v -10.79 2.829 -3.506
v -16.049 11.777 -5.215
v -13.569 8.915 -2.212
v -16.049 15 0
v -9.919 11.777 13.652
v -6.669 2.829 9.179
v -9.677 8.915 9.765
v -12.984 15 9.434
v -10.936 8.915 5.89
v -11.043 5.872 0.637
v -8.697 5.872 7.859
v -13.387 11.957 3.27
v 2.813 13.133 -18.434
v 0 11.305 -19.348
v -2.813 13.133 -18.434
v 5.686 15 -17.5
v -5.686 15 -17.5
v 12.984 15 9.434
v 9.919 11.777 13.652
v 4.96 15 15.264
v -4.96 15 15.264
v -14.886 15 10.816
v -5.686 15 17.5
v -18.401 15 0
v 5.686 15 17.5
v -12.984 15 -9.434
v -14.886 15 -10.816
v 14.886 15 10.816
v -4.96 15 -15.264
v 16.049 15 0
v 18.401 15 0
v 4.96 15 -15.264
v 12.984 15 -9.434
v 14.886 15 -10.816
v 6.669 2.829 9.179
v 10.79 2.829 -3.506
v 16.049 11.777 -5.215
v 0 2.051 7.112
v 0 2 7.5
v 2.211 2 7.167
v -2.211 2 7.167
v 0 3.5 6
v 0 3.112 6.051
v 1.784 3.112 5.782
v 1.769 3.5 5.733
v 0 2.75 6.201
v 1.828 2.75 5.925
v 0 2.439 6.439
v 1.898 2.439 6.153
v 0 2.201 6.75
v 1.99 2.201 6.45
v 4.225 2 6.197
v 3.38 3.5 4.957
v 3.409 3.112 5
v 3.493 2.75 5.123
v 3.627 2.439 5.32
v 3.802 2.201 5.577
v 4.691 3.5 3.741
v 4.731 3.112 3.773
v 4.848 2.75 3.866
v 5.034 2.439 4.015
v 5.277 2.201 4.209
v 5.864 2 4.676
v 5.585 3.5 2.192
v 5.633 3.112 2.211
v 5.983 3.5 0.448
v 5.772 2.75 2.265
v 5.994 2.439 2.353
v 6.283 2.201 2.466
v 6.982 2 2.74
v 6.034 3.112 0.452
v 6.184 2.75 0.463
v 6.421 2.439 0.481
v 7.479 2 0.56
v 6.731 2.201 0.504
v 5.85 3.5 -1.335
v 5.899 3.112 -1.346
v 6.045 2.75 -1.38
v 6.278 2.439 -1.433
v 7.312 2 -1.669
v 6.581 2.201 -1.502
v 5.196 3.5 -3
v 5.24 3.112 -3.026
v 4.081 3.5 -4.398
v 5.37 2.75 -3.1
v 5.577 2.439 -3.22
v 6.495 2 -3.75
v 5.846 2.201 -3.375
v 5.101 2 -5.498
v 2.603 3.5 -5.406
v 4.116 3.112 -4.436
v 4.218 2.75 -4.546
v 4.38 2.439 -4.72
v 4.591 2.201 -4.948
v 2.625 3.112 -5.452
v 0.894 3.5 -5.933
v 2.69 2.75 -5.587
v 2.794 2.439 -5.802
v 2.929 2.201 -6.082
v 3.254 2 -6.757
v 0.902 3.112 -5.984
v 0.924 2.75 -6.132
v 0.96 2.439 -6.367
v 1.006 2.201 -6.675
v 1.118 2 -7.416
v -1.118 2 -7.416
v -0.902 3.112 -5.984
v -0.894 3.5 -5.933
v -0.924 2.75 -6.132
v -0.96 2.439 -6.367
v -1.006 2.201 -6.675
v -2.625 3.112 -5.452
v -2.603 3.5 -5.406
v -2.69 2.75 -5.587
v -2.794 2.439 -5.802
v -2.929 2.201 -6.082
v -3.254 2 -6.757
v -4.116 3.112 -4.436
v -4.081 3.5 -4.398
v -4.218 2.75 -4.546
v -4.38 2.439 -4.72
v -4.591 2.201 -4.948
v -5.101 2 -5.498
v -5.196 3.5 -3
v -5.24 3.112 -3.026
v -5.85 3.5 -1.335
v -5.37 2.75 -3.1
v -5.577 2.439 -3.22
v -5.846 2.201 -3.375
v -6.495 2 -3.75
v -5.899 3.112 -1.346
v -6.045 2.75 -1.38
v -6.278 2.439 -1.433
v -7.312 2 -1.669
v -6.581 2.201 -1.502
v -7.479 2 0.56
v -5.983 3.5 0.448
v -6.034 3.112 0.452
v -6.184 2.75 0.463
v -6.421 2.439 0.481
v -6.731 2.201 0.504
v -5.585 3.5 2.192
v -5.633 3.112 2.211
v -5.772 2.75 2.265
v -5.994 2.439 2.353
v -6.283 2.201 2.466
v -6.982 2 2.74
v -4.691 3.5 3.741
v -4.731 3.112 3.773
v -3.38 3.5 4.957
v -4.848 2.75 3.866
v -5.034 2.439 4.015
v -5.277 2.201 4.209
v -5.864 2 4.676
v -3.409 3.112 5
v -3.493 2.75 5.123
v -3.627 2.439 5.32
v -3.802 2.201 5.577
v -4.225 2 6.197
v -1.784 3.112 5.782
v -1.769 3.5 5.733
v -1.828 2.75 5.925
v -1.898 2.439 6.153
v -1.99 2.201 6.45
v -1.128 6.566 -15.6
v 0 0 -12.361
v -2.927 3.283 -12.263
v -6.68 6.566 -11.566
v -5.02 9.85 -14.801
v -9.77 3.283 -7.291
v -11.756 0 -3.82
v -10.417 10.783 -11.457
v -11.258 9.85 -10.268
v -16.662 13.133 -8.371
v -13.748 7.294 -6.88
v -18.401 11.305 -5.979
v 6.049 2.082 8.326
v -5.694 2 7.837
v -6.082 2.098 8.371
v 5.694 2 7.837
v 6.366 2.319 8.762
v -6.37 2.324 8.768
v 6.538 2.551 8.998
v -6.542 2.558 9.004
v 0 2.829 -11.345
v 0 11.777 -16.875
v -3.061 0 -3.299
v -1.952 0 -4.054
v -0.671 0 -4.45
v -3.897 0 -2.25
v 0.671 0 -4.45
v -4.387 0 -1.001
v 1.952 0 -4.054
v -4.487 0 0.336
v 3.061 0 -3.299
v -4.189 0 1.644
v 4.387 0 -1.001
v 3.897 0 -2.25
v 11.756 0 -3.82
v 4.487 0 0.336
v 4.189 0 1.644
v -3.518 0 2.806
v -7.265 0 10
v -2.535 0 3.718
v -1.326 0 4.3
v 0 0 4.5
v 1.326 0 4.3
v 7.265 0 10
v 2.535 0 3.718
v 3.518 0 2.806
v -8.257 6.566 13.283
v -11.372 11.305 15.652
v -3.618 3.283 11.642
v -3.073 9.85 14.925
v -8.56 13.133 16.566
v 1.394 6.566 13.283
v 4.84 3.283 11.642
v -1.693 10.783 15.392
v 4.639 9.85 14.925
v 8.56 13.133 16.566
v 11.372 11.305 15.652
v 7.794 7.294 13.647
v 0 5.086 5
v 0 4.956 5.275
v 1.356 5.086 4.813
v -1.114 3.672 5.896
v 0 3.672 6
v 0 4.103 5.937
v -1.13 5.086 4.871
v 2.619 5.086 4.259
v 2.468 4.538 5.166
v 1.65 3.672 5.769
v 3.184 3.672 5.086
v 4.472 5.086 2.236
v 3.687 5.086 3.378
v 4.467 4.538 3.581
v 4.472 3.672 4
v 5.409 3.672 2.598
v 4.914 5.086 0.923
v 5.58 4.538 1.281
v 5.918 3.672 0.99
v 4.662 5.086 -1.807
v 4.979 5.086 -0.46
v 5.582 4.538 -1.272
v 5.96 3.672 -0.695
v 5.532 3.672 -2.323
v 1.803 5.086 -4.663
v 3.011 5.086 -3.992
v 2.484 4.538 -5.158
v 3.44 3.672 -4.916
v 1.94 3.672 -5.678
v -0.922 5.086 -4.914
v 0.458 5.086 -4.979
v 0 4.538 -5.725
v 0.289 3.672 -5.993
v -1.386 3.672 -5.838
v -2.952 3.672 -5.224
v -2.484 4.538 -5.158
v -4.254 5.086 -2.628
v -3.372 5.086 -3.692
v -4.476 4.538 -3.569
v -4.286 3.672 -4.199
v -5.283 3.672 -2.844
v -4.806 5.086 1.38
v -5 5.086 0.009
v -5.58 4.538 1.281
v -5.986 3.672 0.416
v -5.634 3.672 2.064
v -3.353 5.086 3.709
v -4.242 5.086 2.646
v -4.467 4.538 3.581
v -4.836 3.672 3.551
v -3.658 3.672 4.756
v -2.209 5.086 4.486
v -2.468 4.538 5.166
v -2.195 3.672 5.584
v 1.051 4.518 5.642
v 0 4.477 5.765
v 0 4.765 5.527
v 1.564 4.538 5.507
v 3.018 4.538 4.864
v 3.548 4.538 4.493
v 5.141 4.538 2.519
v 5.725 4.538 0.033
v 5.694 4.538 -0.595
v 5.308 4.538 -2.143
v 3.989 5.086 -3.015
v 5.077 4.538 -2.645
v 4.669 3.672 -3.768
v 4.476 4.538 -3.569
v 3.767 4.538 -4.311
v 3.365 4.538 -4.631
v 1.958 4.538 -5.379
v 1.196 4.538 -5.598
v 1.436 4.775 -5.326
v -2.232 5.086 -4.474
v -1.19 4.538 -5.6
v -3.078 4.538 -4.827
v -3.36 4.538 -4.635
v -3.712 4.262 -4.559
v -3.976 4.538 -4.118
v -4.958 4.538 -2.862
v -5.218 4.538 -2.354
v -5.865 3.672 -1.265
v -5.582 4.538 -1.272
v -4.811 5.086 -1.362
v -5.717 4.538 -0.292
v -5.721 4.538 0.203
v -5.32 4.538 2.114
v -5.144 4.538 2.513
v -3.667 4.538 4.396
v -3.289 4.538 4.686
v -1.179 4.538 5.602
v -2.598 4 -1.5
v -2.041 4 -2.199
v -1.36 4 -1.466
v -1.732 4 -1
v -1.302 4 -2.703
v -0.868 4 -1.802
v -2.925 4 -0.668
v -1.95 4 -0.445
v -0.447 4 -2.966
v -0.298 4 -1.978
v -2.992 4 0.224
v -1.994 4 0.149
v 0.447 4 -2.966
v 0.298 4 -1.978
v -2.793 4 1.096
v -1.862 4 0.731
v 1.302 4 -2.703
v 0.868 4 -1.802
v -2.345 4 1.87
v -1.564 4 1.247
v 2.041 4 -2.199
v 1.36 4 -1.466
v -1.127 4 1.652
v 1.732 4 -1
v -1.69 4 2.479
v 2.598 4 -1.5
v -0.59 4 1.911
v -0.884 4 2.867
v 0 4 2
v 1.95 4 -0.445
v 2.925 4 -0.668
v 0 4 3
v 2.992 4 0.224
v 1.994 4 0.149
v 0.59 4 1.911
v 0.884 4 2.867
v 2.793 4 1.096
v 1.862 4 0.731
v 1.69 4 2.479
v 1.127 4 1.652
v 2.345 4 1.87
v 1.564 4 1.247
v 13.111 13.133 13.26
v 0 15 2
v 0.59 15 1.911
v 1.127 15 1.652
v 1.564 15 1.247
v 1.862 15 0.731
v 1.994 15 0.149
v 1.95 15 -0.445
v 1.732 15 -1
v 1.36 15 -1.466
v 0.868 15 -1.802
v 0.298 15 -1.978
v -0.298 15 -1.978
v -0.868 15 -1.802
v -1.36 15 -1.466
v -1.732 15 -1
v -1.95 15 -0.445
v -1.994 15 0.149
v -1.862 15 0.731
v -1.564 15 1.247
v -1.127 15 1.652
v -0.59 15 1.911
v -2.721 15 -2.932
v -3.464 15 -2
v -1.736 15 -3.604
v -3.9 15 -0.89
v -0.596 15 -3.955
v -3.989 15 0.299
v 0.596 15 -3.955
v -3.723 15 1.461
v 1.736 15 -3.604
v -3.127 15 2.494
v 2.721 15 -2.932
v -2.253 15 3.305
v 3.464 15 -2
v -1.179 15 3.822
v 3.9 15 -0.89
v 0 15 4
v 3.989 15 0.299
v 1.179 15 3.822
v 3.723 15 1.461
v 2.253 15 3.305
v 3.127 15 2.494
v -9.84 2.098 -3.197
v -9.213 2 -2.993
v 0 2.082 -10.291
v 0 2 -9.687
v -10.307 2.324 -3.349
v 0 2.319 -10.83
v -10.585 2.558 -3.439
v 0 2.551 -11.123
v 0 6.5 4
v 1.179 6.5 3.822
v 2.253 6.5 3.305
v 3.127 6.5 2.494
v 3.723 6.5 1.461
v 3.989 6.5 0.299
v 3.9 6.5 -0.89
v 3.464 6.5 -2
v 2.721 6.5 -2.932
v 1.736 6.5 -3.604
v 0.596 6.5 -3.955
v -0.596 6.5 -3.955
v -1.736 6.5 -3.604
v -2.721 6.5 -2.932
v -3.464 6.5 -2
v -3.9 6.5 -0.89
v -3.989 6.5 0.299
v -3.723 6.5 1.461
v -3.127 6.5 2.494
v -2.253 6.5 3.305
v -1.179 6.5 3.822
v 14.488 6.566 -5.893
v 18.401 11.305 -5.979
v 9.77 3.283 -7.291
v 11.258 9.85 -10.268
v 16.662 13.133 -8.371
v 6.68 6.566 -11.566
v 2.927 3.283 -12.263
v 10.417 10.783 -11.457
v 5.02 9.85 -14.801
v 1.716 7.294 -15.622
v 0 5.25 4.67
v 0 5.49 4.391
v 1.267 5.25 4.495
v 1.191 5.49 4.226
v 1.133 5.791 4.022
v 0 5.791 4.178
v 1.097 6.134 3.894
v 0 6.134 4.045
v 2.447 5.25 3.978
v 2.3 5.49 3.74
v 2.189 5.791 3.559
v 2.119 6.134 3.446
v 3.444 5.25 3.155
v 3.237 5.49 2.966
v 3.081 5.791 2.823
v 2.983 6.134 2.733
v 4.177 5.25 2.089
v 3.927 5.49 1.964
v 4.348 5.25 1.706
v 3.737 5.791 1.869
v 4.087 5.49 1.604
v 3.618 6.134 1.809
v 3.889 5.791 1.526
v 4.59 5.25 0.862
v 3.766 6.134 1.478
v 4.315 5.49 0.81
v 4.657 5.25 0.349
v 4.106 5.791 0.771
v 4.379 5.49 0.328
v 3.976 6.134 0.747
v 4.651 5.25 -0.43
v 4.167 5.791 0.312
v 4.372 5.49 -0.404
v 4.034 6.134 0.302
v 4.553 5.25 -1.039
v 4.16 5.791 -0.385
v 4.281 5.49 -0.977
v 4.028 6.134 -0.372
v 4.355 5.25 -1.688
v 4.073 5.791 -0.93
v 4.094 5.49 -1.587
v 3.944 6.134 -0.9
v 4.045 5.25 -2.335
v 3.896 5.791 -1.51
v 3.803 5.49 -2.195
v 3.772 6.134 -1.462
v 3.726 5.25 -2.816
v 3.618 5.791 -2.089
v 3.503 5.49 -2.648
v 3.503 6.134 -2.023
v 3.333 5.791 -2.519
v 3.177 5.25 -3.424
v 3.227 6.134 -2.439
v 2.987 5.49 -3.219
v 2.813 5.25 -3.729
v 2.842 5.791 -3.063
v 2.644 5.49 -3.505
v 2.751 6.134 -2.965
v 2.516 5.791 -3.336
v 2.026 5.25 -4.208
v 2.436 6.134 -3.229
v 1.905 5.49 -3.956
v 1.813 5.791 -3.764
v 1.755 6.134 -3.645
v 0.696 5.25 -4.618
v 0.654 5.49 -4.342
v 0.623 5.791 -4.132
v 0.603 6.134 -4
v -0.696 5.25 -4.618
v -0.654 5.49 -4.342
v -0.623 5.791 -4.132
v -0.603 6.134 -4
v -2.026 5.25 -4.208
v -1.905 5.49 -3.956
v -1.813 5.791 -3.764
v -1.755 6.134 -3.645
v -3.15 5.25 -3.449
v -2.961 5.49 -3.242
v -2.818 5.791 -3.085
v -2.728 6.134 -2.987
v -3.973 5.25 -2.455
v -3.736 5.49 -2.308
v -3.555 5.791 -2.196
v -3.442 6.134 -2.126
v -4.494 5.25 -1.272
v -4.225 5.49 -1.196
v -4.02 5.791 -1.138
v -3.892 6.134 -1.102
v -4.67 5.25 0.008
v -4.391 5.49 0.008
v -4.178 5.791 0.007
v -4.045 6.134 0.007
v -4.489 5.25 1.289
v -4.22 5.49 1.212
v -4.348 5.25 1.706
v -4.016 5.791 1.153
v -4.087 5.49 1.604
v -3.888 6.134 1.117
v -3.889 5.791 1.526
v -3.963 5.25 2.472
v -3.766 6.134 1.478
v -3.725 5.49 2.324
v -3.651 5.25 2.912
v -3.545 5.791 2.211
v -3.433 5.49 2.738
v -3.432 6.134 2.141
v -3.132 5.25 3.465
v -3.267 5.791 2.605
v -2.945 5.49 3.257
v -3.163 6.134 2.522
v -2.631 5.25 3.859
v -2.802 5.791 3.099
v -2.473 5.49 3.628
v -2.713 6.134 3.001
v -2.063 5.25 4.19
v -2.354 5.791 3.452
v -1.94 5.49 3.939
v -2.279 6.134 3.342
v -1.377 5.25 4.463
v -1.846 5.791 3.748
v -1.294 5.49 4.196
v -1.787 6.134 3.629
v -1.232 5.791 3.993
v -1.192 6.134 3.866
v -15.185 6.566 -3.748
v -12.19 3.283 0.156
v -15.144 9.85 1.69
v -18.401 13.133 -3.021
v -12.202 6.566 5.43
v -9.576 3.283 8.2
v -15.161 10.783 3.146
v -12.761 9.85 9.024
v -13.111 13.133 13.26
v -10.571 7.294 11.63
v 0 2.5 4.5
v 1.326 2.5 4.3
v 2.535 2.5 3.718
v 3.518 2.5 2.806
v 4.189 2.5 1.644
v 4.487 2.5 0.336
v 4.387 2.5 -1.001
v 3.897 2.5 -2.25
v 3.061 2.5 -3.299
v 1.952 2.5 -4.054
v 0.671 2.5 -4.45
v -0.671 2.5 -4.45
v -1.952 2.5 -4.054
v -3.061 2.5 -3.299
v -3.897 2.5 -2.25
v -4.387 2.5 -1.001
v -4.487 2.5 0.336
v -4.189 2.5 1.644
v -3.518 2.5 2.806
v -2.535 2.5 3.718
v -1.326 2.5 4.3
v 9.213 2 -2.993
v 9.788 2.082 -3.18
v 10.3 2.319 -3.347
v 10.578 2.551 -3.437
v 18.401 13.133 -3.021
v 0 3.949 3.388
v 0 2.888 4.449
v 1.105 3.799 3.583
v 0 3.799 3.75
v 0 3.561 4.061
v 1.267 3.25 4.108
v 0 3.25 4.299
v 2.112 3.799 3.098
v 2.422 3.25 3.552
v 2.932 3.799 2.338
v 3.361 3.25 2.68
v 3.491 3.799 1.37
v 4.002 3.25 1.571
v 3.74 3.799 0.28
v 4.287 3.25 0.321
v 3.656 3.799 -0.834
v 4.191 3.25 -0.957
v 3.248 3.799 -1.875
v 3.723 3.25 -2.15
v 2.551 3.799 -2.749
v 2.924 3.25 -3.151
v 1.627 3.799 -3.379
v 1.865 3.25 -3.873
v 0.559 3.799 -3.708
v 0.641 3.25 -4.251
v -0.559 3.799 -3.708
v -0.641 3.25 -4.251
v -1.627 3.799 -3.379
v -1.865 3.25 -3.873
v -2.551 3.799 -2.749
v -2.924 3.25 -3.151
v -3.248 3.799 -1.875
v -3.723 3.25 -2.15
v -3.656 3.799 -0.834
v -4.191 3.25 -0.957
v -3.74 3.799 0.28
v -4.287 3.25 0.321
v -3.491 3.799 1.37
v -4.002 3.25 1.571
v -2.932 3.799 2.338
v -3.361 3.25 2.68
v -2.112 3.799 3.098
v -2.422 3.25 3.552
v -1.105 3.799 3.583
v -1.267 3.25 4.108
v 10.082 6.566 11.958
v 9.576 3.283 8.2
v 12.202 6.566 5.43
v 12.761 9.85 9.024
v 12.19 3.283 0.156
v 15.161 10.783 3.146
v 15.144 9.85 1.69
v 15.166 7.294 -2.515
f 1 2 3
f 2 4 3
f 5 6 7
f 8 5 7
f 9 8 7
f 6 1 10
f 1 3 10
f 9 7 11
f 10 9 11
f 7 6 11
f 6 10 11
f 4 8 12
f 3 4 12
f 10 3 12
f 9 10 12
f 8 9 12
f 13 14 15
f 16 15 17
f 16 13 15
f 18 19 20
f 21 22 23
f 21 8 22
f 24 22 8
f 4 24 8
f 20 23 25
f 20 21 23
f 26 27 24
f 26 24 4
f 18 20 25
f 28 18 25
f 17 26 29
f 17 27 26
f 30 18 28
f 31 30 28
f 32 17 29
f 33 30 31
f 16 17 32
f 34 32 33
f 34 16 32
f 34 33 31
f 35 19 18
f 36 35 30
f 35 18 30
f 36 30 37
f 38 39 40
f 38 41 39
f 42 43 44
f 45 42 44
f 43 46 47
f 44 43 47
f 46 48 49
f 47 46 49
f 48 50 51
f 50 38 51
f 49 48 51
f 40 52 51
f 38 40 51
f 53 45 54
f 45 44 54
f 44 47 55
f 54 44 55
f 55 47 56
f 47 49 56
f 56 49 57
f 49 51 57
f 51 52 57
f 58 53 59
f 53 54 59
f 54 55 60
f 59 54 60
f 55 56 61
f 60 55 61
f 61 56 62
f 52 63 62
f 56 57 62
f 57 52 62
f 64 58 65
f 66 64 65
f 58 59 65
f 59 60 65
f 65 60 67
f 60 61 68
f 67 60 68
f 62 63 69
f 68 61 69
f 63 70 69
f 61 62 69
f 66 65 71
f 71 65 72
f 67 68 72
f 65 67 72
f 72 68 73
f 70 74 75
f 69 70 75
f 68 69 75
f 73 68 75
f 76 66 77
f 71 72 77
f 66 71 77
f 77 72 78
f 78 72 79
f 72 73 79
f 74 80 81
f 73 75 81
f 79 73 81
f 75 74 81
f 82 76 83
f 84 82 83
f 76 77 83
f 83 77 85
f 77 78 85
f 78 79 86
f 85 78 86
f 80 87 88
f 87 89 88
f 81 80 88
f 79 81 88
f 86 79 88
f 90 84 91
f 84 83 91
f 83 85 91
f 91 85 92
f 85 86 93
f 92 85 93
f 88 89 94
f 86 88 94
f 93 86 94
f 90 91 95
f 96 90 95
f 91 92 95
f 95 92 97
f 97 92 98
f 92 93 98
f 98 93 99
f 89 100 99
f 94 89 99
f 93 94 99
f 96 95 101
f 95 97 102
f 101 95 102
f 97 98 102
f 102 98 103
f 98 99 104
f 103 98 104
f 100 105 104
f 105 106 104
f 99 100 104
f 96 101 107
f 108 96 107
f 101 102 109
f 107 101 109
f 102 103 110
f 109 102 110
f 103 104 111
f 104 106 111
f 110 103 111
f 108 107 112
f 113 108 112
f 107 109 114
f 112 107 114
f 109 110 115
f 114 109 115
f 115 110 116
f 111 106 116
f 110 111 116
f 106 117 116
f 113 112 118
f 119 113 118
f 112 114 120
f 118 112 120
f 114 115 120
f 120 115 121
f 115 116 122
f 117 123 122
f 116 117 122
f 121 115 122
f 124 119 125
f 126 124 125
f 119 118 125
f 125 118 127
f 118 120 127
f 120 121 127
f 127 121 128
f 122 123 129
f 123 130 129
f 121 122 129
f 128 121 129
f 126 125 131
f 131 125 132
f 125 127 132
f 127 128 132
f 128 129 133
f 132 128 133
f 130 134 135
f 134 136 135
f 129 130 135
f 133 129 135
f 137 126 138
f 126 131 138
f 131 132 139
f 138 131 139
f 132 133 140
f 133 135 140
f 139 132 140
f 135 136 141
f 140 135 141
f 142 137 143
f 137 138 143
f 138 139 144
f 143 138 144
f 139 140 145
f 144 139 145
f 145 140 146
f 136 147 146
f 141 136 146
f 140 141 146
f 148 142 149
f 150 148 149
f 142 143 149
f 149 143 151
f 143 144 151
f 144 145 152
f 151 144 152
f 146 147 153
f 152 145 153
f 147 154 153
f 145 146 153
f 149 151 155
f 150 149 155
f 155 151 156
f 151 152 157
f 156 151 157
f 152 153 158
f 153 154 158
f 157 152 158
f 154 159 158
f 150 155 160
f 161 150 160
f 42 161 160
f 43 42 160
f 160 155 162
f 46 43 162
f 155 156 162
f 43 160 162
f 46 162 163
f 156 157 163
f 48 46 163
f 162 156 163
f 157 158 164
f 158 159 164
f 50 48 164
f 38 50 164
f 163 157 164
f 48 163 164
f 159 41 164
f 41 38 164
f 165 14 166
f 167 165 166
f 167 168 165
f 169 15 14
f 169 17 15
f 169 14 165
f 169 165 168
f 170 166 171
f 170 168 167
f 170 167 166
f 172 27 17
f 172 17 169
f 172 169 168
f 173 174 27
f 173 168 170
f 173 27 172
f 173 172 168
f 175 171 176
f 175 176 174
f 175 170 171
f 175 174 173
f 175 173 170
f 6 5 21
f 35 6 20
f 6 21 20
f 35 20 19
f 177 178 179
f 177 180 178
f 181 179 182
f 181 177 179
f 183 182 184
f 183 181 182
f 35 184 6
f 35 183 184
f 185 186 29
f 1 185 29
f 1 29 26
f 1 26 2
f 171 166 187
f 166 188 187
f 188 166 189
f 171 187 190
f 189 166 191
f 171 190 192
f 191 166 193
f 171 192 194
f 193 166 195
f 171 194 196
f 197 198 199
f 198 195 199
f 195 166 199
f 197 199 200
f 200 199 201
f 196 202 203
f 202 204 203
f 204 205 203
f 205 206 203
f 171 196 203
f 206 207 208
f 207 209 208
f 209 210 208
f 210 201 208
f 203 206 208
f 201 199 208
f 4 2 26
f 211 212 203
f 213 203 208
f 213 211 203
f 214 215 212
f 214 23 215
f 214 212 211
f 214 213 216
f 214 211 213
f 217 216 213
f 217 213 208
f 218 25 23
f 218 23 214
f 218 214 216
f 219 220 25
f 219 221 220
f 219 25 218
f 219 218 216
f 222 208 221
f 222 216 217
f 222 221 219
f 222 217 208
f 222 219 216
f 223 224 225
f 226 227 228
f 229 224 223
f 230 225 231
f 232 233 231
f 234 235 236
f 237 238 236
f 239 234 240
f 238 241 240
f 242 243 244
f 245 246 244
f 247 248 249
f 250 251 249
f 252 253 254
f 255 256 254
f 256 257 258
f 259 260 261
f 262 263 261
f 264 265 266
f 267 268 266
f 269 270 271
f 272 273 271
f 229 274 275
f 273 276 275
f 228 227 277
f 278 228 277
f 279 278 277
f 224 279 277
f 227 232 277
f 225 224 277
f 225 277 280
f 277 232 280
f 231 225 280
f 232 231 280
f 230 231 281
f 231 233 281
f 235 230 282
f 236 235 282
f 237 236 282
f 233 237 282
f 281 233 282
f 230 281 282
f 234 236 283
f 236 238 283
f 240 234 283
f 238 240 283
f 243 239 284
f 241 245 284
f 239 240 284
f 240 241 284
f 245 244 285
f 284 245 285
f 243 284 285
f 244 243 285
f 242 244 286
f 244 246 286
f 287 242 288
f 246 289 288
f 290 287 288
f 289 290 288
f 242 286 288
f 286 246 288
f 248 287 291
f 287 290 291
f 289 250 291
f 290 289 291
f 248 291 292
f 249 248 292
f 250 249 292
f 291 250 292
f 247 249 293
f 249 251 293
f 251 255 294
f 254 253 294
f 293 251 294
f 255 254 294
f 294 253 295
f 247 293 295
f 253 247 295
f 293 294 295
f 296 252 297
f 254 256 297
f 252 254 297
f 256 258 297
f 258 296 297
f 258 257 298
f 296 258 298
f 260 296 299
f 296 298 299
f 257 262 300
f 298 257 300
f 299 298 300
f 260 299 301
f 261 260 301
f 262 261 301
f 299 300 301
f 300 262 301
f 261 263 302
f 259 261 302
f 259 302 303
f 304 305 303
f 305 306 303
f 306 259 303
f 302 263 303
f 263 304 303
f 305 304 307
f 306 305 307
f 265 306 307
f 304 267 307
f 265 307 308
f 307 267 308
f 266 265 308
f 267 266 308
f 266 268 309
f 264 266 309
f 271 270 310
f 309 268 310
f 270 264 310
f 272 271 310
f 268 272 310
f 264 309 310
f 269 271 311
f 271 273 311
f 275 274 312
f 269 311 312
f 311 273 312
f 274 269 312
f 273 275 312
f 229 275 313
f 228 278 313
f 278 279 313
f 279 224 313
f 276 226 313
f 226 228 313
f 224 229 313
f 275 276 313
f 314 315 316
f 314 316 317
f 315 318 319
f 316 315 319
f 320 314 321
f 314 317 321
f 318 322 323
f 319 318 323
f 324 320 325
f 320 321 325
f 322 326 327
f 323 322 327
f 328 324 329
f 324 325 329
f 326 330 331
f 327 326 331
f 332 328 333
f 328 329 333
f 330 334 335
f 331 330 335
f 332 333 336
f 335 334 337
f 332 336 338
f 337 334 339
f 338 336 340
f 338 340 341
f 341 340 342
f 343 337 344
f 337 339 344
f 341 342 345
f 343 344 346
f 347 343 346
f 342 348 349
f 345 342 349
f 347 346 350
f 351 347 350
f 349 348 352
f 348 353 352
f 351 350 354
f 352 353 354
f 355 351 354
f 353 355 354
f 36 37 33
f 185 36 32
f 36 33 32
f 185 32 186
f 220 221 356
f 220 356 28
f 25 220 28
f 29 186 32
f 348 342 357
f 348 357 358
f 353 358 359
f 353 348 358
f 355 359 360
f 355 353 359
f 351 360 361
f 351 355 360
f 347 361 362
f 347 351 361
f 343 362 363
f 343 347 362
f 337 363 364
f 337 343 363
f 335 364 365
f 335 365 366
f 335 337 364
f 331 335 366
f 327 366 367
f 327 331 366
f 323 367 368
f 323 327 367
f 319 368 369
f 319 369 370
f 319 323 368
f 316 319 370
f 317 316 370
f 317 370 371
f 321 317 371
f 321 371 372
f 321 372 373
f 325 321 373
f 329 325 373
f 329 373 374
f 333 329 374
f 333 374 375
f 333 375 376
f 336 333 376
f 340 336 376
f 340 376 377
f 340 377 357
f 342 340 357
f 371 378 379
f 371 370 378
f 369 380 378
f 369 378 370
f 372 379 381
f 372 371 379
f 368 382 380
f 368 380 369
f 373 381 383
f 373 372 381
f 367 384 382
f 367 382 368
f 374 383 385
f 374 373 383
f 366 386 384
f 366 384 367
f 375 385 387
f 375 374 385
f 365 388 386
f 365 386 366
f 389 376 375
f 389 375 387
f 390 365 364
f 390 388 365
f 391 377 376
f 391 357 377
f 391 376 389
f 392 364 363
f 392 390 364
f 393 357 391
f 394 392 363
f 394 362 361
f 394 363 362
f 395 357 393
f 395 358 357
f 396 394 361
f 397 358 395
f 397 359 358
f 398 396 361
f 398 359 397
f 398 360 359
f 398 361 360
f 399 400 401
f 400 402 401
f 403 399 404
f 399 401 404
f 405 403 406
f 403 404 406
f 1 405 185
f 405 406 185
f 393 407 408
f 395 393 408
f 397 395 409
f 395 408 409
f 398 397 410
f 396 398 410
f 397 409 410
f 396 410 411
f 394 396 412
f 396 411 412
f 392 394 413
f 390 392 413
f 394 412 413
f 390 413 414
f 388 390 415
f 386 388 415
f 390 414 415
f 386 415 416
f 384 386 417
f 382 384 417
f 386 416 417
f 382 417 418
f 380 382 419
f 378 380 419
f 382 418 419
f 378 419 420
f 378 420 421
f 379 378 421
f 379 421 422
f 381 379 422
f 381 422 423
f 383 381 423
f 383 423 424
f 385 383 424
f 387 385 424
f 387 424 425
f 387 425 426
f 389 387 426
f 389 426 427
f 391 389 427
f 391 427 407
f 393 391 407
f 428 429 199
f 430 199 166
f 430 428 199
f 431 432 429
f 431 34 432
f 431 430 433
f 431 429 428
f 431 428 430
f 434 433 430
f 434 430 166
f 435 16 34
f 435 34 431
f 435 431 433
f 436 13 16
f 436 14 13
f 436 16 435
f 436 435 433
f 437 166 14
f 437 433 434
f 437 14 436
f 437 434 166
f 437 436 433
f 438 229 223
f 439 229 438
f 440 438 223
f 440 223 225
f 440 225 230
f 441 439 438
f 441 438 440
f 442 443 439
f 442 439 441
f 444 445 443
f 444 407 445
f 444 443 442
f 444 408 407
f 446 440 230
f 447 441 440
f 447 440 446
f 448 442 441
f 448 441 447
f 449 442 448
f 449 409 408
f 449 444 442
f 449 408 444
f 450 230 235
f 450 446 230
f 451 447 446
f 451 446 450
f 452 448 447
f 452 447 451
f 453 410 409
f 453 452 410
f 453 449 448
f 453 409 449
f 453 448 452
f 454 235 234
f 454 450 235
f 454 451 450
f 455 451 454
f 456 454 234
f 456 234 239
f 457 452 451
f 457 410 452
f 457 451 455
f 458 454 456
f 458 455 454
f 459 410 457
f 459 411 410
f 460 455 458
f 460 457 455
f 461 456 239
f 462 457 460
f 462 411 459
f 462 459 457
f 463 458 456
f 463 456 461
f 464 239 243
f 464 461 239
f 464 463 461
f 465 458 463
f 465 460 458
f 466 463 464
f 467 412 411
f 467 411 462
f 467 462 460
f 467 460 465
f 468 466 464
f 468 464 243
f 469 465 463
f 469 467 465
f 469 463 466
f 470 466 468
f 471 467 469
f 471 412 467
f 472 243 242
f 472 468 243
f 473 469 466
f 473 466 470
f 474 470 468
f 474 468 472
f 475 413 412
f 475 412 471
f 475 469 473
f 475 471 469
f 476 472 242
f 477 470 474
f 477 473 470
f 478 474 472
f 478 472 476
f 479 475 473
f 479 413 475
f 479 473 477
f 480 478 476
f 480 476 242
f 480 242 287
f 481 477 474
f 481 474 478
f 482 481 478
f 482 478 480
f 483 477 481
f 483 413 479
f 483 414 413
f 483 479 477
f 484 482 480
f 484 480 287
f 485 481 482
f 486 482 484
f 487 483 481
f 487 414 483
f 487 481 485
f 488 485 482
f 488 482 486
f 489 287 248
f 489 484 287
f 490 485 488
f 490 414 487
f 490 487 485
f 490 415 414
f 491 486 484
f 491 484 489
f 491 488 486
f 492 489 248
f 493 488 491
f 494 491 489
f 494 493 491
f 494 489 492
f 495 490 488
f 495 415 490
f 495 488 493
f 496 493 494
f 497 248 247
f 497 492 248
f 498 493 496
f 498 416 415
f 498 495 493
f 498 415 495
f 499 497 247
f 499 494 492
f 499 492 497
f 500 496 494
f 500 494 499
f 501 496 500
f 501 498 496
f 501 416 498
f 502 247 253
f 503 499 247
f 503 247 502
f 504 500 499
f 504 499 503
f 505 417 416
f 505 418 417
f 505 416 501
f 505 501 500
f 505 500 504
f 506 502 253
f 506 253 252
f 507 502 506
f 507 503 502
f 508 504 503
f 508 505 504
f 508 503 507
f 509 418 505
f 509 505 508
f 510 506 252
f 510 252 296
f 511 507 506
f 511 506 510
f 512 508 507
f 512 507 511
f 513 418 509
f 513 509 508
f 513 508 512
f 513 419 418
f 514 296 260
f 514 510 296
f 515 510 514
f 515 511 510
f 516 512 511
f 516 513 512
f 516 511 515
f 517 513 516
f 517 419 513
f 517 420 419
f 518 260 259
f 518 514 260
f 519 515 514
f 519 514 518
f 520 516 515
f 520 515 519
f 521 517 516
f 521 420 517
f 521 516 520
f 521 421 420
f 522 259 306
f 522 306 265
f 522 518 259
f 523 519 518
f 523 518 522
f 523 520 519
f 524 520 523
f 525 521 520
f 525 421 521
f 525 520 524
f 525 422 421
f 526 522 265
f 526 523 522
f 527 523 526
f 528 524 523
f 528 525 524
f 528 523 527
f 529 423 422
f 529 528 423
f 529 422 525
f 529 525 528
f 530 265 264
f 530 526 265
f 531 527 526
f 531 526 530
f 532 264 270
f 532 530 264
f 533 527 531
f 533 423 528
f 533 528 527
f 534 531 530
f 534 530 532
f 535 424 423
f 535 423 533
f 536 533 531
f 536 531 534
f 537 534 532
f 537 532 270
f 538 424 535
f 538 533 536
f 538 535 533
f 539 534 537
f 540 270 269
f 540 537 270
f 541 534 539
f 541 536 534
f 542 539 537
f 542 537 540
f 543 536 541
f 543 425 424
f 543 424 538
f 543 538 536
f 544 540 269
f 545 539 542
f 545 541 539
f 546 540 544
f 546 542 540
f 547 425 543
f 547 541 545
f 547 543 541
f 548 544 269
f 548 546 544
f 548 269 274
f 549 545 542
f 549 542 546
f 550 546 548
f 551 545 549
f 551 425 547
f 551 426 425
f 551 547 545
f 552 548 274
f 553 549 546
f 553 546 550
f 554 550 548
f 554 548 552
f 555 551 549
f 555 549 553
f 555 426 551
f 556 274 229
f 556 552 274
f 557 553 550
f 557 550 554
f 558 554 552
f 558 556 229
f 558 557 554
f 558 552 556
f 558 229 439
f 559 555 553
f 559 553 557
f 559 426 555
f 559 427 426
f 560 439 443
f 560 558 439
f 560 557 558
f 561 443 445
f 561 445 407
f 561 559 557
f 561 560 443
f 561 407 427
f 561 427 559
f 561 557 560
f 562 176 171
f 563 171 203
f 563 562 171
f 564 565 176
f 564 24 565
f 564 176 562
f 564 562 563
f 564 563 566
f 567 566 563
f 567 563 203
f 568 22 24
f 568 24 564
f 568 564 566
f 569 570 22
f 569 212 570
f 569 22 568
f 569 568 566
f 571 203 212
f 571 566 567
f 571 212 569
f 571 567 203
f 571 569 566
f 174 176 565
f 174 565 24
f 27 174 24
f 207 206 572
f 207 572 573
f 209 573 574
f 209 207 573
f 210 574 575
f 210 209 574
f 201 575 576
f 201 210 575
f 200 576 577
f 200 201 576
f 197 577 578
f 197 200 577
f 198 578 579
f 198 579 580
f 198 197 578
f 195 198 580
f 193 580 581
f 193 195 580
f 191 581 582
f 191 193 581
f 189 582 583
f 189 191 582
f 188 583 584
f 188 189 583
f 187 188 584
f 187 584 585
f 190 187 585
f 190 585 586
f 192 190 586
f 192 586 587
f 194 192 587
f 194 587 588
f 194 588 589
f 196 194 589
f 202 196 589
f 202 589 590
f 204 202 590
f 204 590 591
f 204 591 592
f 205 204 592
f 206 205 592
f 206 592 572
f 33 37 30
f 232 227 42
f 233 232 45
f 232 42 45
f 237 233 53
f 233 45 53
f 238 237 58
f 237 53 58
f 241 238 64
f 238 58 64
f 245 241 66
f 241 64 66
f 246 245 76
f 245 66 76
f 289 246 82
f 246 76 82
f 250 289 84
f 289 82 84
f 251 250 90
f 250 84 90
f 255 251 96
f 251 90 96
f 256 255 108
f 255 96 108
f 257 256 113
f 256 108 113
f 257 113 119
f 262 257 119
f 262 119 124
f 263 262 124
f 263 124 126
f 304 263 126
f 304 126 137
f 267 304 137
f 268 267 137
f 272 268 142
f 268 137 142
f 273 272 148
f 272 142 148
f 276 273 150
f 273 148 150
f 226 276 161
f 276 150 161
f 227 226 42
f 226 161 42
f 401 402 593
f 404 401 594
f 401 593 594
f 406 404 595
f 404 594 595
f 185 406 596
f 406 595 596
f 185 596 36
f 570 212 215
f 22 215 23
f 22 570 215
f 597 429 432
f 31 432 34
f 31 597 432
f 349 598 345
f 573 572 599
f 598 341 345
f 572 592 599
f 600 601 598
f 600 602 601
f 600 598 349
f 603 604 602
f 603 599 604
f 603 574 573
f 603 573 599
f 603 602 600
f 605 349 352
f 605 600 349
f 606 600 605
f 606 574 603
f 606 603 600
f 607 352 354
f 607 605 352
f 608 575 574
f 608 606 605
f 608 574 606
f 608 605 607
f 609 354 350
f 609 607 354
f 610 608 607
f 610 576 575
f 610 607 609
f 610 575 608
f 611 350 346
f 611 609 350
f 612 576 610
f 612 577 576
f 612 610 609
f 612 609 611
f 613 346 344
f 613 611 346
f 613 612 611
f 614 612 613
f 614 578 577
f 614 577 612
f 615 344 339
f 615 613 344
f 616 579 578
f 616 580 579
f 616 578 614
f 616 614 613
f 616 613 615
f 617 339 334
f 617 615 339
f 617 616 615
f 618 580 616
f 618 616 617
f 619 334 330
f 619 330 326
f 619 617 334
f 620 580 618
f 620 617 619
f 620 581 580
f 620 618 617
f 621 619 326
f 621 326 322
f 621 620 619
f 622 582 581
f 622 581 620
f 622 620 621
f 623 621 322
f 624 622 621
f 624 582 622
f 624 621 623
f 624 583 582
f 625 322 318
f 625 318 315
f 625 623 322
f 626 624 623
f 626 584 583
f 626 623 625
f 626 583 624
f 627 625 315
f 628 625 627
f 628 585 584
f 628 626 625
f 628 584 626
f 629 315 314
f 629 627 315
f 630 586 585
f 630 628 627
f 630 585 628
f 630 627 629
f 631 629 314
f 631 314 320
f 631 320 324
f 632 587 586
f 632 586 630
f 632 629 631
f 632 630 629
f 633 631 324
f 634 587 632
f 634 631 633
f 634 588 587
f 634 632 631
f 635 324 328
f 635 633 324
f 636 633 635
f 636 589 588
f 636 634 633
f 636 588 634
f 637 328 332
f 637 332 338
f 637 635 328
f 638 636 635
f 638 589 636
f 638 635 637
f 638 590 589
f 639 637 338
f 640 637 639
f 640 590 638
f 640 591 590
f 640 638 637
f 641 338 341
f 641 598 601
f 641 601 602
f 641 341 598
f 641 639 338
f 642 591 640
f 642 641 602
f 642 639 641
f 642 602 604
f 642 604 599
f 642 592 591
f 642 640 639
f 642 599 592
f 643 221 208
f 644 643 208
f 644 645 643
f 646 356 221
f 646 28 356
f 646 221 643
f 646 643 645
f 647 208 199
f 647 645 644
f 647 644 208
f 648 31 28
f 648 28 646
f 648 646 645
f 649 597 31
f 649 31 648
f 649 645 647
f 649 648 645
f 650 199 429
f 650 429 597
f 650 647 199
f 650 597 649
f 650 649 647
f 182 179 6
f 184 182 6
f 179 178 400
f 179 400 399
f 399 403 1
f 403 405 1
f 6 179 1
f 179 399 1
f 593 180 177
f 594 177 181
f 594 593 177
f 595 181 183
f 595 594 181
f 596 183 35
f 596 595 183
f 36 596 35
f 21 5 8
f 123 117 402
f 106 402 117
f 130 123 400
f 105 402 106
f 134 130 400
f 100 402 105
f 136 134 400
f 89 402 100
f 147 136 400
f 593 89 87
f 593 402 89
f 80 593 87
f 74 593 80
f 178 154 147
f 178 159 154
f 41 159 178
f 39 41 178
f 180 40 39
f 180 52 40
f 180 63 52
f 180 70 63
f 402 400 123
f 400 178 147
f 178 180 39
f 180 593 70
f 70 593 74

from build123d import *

# Parameters (mm, degrees)
BOSS_EXTRUDE1_DEPTH     = 30
BOSS_EXTRUDE1_TAPER     = -26.56505118
SKETCH3_OUTSIDE_W       = 108.076
SKETCH3_OUTSIDE_H       = 105.2
CUT_EXTRUDE1_DEPTH      = 30
CUT_EXTRUDE1_TAPER      = 26.56505118
SKETCH5_R               = 19.347524159
CUT_EXTRUDE2_DEPTH      = 25
SHELL1_T                = -2
SKETCH6_R               = 4
SKETCH6_R_2             = 2
BOSS_EXTRUDE2_DEPTH     = 13
SKETCH10_R              = 6
SKETCH10_R_2            = 4
BOSS_EXTRUDE4_DEPTH     = 3
FILLET5_R               = 1.5
SKETCH10_3_R            = 4.5
SKETCH10_3_R_2          = 4
CUT_EXTRUDE3_DEPTH      = 2
CUT_EXTRUDE3_DEPTH_BACK = 2
FILLET6_R               = 1.5


with BuildPart() as part:
    # Sketch1 → Boss-Extrude1 (new body)
    with BuildSketch(Plane(origin=(0, 0, 0), x_dir=(1, 0, 0), z_dir=(0, 1, 0))):
        Polygon((0, 12.360679775), (-11.755705046, 3.819660113), (-7.26542528, -10), (7.26542528, -10), (11.755705046, 3.819660113), align=None)
    extrude(amount=BOSS_EXTRUDE1_DEPTH, taper=BOSS_EXTRUDE1_TAPER)

    # Sketch3 outside → Cut-Extrude1 (cut)
    with BuildSketch(Plane(origin=(0, 30, 0), x_dir=(1, 0, 0), z_dir=(0, 1, 0))):
        with Locations((0, 2.951)):
            Rectangle(SKETCH3_OUTSIDE_W, SKETCH3_OUTSIDE_H)
        Polygon((7.26542528, 10), (-7.26542528, 10), (-11.755705046, -3.819660113), (0, -12.360679775), (11.755705046, -3.819660113), align=None, mode=Mode.SUBTRACT)
    extrude(amount=-CUT_EXTRUDE1_DEPTH, taper=CUT_EXTRUDE1_TAPER, mode=Mode.SUBTRACT)

    # Sketch5 → Cut-Extrude2 (cut)
    with BuildSketch(Plane(origin=(0, 15, 0), x_dir=(1, 0, 0), z_dir=(0, 1, 0))):
        Circle(SKETCH5_R)
    extrude(amount=CUT_EXTRUDE2_DEPTH, mode=Mode.SUBTRACT)

    # Shell1
    shell1_openings = [part.faces().sort_by_distance(p)[0] for p in [
        (0, 15, 0),
    ]]
    offset(amount=SHELL1_T, openings=shell1_openings, kind=Kind.INTERSECTION)

    # Sketch6 → Boss-Extrude2 (add)
    with BuildSketch(Plane(origin=(0, 2, 0), x_dir=(1, 0, 0), z_dir=(0, 1, 0))):
        with Locations(Location((0, 0, 0), (0, 0, 270))):
            Circle(SKETCH6_R)
        with Locations(Location((0, 0, 0), (0, 0, 270))):
            Circle(SKETCH6_R_2, mode=Mode.SUBTRACT)
    extrude(amount=BOSS_EXTRUDE2_DEPTH)

    # Sketch10 → Boss-Extrude4 (add)
    with BuildSketch(Plane(origin=(0, 2, 0), x_dir=(1, 0, 0), z_dir=(0, 1, 0))):
        with Locations(Location((0, 0, 0), (0, 0, 270))):
            Circle(SKETCH10_R)
        with Locations(Location((0, 0, 0), (0, 0, 270))):
            Circle(SKETCH10_R_2, mode=Mode.SUBTRACT)
    extrude(amount=BOSS_EXTRUDE4_DEPTH)

    # Fillet5
    fillet5_edges = [part.edges().sort_by_distance(p)[0] for p in [
        (0, 2, -6),
        (0, 5, -4),
        (5.151309995, 2, -7.090169944),
        (-5.151309995, 2, -7.090169944),
        (-8.334994658, 2, 2.708203933),
        (0, 2, 8.763932023),
        (8.334994658, 2, 2.708203933),
    ]]
    fillet(fillet5_edges, radius=FILLET5_R)

    # Sketch10<3> → Cut-Extrude3 (cut, two sides)
    with BuildSketch(Plane(origin=(0, 2, 0), x_dir=(1, 0, 0), z_dir=(0, 1, 0))) as cut_extrude3_sk:
        with Locations(Location((0, 0, 0), (0, 0, 270))):
            Circle(SKETCH10_3_R)
        with Locations(Location((0, 0, 0), (0, 0, 270))):
            Circle(SKETCH10_3_R_2, mode=Mode.SUBTRACT)
        with Locations(Location((0, 0, 0), (0, 0, 270))):
            Circle(SKETCH10_3_R_2)
    extrude(amount=CUT_EXTRUDE3_DEPTH, mode=Mode.SUBTRACT)
    extrude(cut_extrude3_sk.sketch, amount=-CUT_EXTRUDE3_DEPTH_BACK, mode=Mode.SUBTRACT)

    # Fillet6
    fillet6_edges = [part.edges().sort_by_distance(p)[0] for p in [
        (0, 4, -4.5),
        (0, 5, -6),
    ]]
    fillet(fillet6_edges, radius=FILLET6_R)


solid = part.part
